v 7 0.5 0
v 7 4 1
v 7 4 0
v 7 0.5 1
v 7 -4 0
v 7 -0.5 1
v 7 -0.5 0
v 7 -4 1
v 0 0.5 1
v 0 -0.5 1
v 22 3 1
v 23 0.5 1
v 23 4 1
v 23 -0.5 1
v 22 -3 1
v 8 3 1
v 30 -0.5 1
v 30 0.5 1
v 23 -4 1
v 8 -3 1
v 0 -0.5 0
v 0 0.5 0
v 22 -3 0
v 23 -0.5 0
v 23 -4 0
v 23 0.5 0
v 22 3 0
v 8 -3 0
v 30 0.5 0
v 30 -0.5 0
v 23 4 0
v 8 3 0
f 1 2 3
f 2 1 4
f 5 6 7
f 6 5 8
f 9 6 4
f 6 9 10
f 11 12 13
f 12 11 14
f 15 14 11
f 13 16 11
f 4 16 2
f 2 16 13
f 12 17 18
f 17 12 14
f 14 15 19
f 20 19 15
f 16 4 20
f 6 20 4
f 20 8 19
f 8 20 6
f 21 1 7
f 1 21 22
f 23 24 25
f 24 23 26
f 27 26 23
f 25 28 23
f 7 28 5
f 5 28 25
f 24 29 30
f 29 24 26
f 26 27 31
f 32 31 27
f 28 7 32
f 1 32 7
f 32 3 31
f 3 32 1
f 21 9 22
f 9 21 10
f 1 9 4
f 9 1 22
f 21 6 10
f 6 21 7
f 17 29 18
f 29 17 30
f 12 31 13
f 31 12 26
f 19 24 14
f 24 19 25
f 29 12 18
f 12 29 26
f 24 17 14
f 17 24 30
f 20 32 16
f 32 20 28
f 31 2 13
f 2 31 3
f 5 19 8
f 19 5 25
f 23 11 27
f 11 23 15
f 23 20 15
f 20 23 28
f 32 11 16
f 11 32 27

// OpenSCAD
module resistor(length, width, thickness, height)
{
    translate([0,-thickness/2,0])cube([length/2-width, thickness, height]);
    translate([length/2+width,-thickness/2,0])cube([length/2-width, thickness, height]);
    
    translate([length/2-width,-width/2, 0])cube([thickness, width, height]);
    translate([length/2+width-thickness,-width/2,0])cube([thickness, width, height]);
    translate([length/2-width,-width/2, 0])cube([2*width, thickness, height]);
    translate([length/2-width, width/2-thickness, 0])cube([2*width, thickness, height]);
}

resistor(30, 8, 1, 1);
